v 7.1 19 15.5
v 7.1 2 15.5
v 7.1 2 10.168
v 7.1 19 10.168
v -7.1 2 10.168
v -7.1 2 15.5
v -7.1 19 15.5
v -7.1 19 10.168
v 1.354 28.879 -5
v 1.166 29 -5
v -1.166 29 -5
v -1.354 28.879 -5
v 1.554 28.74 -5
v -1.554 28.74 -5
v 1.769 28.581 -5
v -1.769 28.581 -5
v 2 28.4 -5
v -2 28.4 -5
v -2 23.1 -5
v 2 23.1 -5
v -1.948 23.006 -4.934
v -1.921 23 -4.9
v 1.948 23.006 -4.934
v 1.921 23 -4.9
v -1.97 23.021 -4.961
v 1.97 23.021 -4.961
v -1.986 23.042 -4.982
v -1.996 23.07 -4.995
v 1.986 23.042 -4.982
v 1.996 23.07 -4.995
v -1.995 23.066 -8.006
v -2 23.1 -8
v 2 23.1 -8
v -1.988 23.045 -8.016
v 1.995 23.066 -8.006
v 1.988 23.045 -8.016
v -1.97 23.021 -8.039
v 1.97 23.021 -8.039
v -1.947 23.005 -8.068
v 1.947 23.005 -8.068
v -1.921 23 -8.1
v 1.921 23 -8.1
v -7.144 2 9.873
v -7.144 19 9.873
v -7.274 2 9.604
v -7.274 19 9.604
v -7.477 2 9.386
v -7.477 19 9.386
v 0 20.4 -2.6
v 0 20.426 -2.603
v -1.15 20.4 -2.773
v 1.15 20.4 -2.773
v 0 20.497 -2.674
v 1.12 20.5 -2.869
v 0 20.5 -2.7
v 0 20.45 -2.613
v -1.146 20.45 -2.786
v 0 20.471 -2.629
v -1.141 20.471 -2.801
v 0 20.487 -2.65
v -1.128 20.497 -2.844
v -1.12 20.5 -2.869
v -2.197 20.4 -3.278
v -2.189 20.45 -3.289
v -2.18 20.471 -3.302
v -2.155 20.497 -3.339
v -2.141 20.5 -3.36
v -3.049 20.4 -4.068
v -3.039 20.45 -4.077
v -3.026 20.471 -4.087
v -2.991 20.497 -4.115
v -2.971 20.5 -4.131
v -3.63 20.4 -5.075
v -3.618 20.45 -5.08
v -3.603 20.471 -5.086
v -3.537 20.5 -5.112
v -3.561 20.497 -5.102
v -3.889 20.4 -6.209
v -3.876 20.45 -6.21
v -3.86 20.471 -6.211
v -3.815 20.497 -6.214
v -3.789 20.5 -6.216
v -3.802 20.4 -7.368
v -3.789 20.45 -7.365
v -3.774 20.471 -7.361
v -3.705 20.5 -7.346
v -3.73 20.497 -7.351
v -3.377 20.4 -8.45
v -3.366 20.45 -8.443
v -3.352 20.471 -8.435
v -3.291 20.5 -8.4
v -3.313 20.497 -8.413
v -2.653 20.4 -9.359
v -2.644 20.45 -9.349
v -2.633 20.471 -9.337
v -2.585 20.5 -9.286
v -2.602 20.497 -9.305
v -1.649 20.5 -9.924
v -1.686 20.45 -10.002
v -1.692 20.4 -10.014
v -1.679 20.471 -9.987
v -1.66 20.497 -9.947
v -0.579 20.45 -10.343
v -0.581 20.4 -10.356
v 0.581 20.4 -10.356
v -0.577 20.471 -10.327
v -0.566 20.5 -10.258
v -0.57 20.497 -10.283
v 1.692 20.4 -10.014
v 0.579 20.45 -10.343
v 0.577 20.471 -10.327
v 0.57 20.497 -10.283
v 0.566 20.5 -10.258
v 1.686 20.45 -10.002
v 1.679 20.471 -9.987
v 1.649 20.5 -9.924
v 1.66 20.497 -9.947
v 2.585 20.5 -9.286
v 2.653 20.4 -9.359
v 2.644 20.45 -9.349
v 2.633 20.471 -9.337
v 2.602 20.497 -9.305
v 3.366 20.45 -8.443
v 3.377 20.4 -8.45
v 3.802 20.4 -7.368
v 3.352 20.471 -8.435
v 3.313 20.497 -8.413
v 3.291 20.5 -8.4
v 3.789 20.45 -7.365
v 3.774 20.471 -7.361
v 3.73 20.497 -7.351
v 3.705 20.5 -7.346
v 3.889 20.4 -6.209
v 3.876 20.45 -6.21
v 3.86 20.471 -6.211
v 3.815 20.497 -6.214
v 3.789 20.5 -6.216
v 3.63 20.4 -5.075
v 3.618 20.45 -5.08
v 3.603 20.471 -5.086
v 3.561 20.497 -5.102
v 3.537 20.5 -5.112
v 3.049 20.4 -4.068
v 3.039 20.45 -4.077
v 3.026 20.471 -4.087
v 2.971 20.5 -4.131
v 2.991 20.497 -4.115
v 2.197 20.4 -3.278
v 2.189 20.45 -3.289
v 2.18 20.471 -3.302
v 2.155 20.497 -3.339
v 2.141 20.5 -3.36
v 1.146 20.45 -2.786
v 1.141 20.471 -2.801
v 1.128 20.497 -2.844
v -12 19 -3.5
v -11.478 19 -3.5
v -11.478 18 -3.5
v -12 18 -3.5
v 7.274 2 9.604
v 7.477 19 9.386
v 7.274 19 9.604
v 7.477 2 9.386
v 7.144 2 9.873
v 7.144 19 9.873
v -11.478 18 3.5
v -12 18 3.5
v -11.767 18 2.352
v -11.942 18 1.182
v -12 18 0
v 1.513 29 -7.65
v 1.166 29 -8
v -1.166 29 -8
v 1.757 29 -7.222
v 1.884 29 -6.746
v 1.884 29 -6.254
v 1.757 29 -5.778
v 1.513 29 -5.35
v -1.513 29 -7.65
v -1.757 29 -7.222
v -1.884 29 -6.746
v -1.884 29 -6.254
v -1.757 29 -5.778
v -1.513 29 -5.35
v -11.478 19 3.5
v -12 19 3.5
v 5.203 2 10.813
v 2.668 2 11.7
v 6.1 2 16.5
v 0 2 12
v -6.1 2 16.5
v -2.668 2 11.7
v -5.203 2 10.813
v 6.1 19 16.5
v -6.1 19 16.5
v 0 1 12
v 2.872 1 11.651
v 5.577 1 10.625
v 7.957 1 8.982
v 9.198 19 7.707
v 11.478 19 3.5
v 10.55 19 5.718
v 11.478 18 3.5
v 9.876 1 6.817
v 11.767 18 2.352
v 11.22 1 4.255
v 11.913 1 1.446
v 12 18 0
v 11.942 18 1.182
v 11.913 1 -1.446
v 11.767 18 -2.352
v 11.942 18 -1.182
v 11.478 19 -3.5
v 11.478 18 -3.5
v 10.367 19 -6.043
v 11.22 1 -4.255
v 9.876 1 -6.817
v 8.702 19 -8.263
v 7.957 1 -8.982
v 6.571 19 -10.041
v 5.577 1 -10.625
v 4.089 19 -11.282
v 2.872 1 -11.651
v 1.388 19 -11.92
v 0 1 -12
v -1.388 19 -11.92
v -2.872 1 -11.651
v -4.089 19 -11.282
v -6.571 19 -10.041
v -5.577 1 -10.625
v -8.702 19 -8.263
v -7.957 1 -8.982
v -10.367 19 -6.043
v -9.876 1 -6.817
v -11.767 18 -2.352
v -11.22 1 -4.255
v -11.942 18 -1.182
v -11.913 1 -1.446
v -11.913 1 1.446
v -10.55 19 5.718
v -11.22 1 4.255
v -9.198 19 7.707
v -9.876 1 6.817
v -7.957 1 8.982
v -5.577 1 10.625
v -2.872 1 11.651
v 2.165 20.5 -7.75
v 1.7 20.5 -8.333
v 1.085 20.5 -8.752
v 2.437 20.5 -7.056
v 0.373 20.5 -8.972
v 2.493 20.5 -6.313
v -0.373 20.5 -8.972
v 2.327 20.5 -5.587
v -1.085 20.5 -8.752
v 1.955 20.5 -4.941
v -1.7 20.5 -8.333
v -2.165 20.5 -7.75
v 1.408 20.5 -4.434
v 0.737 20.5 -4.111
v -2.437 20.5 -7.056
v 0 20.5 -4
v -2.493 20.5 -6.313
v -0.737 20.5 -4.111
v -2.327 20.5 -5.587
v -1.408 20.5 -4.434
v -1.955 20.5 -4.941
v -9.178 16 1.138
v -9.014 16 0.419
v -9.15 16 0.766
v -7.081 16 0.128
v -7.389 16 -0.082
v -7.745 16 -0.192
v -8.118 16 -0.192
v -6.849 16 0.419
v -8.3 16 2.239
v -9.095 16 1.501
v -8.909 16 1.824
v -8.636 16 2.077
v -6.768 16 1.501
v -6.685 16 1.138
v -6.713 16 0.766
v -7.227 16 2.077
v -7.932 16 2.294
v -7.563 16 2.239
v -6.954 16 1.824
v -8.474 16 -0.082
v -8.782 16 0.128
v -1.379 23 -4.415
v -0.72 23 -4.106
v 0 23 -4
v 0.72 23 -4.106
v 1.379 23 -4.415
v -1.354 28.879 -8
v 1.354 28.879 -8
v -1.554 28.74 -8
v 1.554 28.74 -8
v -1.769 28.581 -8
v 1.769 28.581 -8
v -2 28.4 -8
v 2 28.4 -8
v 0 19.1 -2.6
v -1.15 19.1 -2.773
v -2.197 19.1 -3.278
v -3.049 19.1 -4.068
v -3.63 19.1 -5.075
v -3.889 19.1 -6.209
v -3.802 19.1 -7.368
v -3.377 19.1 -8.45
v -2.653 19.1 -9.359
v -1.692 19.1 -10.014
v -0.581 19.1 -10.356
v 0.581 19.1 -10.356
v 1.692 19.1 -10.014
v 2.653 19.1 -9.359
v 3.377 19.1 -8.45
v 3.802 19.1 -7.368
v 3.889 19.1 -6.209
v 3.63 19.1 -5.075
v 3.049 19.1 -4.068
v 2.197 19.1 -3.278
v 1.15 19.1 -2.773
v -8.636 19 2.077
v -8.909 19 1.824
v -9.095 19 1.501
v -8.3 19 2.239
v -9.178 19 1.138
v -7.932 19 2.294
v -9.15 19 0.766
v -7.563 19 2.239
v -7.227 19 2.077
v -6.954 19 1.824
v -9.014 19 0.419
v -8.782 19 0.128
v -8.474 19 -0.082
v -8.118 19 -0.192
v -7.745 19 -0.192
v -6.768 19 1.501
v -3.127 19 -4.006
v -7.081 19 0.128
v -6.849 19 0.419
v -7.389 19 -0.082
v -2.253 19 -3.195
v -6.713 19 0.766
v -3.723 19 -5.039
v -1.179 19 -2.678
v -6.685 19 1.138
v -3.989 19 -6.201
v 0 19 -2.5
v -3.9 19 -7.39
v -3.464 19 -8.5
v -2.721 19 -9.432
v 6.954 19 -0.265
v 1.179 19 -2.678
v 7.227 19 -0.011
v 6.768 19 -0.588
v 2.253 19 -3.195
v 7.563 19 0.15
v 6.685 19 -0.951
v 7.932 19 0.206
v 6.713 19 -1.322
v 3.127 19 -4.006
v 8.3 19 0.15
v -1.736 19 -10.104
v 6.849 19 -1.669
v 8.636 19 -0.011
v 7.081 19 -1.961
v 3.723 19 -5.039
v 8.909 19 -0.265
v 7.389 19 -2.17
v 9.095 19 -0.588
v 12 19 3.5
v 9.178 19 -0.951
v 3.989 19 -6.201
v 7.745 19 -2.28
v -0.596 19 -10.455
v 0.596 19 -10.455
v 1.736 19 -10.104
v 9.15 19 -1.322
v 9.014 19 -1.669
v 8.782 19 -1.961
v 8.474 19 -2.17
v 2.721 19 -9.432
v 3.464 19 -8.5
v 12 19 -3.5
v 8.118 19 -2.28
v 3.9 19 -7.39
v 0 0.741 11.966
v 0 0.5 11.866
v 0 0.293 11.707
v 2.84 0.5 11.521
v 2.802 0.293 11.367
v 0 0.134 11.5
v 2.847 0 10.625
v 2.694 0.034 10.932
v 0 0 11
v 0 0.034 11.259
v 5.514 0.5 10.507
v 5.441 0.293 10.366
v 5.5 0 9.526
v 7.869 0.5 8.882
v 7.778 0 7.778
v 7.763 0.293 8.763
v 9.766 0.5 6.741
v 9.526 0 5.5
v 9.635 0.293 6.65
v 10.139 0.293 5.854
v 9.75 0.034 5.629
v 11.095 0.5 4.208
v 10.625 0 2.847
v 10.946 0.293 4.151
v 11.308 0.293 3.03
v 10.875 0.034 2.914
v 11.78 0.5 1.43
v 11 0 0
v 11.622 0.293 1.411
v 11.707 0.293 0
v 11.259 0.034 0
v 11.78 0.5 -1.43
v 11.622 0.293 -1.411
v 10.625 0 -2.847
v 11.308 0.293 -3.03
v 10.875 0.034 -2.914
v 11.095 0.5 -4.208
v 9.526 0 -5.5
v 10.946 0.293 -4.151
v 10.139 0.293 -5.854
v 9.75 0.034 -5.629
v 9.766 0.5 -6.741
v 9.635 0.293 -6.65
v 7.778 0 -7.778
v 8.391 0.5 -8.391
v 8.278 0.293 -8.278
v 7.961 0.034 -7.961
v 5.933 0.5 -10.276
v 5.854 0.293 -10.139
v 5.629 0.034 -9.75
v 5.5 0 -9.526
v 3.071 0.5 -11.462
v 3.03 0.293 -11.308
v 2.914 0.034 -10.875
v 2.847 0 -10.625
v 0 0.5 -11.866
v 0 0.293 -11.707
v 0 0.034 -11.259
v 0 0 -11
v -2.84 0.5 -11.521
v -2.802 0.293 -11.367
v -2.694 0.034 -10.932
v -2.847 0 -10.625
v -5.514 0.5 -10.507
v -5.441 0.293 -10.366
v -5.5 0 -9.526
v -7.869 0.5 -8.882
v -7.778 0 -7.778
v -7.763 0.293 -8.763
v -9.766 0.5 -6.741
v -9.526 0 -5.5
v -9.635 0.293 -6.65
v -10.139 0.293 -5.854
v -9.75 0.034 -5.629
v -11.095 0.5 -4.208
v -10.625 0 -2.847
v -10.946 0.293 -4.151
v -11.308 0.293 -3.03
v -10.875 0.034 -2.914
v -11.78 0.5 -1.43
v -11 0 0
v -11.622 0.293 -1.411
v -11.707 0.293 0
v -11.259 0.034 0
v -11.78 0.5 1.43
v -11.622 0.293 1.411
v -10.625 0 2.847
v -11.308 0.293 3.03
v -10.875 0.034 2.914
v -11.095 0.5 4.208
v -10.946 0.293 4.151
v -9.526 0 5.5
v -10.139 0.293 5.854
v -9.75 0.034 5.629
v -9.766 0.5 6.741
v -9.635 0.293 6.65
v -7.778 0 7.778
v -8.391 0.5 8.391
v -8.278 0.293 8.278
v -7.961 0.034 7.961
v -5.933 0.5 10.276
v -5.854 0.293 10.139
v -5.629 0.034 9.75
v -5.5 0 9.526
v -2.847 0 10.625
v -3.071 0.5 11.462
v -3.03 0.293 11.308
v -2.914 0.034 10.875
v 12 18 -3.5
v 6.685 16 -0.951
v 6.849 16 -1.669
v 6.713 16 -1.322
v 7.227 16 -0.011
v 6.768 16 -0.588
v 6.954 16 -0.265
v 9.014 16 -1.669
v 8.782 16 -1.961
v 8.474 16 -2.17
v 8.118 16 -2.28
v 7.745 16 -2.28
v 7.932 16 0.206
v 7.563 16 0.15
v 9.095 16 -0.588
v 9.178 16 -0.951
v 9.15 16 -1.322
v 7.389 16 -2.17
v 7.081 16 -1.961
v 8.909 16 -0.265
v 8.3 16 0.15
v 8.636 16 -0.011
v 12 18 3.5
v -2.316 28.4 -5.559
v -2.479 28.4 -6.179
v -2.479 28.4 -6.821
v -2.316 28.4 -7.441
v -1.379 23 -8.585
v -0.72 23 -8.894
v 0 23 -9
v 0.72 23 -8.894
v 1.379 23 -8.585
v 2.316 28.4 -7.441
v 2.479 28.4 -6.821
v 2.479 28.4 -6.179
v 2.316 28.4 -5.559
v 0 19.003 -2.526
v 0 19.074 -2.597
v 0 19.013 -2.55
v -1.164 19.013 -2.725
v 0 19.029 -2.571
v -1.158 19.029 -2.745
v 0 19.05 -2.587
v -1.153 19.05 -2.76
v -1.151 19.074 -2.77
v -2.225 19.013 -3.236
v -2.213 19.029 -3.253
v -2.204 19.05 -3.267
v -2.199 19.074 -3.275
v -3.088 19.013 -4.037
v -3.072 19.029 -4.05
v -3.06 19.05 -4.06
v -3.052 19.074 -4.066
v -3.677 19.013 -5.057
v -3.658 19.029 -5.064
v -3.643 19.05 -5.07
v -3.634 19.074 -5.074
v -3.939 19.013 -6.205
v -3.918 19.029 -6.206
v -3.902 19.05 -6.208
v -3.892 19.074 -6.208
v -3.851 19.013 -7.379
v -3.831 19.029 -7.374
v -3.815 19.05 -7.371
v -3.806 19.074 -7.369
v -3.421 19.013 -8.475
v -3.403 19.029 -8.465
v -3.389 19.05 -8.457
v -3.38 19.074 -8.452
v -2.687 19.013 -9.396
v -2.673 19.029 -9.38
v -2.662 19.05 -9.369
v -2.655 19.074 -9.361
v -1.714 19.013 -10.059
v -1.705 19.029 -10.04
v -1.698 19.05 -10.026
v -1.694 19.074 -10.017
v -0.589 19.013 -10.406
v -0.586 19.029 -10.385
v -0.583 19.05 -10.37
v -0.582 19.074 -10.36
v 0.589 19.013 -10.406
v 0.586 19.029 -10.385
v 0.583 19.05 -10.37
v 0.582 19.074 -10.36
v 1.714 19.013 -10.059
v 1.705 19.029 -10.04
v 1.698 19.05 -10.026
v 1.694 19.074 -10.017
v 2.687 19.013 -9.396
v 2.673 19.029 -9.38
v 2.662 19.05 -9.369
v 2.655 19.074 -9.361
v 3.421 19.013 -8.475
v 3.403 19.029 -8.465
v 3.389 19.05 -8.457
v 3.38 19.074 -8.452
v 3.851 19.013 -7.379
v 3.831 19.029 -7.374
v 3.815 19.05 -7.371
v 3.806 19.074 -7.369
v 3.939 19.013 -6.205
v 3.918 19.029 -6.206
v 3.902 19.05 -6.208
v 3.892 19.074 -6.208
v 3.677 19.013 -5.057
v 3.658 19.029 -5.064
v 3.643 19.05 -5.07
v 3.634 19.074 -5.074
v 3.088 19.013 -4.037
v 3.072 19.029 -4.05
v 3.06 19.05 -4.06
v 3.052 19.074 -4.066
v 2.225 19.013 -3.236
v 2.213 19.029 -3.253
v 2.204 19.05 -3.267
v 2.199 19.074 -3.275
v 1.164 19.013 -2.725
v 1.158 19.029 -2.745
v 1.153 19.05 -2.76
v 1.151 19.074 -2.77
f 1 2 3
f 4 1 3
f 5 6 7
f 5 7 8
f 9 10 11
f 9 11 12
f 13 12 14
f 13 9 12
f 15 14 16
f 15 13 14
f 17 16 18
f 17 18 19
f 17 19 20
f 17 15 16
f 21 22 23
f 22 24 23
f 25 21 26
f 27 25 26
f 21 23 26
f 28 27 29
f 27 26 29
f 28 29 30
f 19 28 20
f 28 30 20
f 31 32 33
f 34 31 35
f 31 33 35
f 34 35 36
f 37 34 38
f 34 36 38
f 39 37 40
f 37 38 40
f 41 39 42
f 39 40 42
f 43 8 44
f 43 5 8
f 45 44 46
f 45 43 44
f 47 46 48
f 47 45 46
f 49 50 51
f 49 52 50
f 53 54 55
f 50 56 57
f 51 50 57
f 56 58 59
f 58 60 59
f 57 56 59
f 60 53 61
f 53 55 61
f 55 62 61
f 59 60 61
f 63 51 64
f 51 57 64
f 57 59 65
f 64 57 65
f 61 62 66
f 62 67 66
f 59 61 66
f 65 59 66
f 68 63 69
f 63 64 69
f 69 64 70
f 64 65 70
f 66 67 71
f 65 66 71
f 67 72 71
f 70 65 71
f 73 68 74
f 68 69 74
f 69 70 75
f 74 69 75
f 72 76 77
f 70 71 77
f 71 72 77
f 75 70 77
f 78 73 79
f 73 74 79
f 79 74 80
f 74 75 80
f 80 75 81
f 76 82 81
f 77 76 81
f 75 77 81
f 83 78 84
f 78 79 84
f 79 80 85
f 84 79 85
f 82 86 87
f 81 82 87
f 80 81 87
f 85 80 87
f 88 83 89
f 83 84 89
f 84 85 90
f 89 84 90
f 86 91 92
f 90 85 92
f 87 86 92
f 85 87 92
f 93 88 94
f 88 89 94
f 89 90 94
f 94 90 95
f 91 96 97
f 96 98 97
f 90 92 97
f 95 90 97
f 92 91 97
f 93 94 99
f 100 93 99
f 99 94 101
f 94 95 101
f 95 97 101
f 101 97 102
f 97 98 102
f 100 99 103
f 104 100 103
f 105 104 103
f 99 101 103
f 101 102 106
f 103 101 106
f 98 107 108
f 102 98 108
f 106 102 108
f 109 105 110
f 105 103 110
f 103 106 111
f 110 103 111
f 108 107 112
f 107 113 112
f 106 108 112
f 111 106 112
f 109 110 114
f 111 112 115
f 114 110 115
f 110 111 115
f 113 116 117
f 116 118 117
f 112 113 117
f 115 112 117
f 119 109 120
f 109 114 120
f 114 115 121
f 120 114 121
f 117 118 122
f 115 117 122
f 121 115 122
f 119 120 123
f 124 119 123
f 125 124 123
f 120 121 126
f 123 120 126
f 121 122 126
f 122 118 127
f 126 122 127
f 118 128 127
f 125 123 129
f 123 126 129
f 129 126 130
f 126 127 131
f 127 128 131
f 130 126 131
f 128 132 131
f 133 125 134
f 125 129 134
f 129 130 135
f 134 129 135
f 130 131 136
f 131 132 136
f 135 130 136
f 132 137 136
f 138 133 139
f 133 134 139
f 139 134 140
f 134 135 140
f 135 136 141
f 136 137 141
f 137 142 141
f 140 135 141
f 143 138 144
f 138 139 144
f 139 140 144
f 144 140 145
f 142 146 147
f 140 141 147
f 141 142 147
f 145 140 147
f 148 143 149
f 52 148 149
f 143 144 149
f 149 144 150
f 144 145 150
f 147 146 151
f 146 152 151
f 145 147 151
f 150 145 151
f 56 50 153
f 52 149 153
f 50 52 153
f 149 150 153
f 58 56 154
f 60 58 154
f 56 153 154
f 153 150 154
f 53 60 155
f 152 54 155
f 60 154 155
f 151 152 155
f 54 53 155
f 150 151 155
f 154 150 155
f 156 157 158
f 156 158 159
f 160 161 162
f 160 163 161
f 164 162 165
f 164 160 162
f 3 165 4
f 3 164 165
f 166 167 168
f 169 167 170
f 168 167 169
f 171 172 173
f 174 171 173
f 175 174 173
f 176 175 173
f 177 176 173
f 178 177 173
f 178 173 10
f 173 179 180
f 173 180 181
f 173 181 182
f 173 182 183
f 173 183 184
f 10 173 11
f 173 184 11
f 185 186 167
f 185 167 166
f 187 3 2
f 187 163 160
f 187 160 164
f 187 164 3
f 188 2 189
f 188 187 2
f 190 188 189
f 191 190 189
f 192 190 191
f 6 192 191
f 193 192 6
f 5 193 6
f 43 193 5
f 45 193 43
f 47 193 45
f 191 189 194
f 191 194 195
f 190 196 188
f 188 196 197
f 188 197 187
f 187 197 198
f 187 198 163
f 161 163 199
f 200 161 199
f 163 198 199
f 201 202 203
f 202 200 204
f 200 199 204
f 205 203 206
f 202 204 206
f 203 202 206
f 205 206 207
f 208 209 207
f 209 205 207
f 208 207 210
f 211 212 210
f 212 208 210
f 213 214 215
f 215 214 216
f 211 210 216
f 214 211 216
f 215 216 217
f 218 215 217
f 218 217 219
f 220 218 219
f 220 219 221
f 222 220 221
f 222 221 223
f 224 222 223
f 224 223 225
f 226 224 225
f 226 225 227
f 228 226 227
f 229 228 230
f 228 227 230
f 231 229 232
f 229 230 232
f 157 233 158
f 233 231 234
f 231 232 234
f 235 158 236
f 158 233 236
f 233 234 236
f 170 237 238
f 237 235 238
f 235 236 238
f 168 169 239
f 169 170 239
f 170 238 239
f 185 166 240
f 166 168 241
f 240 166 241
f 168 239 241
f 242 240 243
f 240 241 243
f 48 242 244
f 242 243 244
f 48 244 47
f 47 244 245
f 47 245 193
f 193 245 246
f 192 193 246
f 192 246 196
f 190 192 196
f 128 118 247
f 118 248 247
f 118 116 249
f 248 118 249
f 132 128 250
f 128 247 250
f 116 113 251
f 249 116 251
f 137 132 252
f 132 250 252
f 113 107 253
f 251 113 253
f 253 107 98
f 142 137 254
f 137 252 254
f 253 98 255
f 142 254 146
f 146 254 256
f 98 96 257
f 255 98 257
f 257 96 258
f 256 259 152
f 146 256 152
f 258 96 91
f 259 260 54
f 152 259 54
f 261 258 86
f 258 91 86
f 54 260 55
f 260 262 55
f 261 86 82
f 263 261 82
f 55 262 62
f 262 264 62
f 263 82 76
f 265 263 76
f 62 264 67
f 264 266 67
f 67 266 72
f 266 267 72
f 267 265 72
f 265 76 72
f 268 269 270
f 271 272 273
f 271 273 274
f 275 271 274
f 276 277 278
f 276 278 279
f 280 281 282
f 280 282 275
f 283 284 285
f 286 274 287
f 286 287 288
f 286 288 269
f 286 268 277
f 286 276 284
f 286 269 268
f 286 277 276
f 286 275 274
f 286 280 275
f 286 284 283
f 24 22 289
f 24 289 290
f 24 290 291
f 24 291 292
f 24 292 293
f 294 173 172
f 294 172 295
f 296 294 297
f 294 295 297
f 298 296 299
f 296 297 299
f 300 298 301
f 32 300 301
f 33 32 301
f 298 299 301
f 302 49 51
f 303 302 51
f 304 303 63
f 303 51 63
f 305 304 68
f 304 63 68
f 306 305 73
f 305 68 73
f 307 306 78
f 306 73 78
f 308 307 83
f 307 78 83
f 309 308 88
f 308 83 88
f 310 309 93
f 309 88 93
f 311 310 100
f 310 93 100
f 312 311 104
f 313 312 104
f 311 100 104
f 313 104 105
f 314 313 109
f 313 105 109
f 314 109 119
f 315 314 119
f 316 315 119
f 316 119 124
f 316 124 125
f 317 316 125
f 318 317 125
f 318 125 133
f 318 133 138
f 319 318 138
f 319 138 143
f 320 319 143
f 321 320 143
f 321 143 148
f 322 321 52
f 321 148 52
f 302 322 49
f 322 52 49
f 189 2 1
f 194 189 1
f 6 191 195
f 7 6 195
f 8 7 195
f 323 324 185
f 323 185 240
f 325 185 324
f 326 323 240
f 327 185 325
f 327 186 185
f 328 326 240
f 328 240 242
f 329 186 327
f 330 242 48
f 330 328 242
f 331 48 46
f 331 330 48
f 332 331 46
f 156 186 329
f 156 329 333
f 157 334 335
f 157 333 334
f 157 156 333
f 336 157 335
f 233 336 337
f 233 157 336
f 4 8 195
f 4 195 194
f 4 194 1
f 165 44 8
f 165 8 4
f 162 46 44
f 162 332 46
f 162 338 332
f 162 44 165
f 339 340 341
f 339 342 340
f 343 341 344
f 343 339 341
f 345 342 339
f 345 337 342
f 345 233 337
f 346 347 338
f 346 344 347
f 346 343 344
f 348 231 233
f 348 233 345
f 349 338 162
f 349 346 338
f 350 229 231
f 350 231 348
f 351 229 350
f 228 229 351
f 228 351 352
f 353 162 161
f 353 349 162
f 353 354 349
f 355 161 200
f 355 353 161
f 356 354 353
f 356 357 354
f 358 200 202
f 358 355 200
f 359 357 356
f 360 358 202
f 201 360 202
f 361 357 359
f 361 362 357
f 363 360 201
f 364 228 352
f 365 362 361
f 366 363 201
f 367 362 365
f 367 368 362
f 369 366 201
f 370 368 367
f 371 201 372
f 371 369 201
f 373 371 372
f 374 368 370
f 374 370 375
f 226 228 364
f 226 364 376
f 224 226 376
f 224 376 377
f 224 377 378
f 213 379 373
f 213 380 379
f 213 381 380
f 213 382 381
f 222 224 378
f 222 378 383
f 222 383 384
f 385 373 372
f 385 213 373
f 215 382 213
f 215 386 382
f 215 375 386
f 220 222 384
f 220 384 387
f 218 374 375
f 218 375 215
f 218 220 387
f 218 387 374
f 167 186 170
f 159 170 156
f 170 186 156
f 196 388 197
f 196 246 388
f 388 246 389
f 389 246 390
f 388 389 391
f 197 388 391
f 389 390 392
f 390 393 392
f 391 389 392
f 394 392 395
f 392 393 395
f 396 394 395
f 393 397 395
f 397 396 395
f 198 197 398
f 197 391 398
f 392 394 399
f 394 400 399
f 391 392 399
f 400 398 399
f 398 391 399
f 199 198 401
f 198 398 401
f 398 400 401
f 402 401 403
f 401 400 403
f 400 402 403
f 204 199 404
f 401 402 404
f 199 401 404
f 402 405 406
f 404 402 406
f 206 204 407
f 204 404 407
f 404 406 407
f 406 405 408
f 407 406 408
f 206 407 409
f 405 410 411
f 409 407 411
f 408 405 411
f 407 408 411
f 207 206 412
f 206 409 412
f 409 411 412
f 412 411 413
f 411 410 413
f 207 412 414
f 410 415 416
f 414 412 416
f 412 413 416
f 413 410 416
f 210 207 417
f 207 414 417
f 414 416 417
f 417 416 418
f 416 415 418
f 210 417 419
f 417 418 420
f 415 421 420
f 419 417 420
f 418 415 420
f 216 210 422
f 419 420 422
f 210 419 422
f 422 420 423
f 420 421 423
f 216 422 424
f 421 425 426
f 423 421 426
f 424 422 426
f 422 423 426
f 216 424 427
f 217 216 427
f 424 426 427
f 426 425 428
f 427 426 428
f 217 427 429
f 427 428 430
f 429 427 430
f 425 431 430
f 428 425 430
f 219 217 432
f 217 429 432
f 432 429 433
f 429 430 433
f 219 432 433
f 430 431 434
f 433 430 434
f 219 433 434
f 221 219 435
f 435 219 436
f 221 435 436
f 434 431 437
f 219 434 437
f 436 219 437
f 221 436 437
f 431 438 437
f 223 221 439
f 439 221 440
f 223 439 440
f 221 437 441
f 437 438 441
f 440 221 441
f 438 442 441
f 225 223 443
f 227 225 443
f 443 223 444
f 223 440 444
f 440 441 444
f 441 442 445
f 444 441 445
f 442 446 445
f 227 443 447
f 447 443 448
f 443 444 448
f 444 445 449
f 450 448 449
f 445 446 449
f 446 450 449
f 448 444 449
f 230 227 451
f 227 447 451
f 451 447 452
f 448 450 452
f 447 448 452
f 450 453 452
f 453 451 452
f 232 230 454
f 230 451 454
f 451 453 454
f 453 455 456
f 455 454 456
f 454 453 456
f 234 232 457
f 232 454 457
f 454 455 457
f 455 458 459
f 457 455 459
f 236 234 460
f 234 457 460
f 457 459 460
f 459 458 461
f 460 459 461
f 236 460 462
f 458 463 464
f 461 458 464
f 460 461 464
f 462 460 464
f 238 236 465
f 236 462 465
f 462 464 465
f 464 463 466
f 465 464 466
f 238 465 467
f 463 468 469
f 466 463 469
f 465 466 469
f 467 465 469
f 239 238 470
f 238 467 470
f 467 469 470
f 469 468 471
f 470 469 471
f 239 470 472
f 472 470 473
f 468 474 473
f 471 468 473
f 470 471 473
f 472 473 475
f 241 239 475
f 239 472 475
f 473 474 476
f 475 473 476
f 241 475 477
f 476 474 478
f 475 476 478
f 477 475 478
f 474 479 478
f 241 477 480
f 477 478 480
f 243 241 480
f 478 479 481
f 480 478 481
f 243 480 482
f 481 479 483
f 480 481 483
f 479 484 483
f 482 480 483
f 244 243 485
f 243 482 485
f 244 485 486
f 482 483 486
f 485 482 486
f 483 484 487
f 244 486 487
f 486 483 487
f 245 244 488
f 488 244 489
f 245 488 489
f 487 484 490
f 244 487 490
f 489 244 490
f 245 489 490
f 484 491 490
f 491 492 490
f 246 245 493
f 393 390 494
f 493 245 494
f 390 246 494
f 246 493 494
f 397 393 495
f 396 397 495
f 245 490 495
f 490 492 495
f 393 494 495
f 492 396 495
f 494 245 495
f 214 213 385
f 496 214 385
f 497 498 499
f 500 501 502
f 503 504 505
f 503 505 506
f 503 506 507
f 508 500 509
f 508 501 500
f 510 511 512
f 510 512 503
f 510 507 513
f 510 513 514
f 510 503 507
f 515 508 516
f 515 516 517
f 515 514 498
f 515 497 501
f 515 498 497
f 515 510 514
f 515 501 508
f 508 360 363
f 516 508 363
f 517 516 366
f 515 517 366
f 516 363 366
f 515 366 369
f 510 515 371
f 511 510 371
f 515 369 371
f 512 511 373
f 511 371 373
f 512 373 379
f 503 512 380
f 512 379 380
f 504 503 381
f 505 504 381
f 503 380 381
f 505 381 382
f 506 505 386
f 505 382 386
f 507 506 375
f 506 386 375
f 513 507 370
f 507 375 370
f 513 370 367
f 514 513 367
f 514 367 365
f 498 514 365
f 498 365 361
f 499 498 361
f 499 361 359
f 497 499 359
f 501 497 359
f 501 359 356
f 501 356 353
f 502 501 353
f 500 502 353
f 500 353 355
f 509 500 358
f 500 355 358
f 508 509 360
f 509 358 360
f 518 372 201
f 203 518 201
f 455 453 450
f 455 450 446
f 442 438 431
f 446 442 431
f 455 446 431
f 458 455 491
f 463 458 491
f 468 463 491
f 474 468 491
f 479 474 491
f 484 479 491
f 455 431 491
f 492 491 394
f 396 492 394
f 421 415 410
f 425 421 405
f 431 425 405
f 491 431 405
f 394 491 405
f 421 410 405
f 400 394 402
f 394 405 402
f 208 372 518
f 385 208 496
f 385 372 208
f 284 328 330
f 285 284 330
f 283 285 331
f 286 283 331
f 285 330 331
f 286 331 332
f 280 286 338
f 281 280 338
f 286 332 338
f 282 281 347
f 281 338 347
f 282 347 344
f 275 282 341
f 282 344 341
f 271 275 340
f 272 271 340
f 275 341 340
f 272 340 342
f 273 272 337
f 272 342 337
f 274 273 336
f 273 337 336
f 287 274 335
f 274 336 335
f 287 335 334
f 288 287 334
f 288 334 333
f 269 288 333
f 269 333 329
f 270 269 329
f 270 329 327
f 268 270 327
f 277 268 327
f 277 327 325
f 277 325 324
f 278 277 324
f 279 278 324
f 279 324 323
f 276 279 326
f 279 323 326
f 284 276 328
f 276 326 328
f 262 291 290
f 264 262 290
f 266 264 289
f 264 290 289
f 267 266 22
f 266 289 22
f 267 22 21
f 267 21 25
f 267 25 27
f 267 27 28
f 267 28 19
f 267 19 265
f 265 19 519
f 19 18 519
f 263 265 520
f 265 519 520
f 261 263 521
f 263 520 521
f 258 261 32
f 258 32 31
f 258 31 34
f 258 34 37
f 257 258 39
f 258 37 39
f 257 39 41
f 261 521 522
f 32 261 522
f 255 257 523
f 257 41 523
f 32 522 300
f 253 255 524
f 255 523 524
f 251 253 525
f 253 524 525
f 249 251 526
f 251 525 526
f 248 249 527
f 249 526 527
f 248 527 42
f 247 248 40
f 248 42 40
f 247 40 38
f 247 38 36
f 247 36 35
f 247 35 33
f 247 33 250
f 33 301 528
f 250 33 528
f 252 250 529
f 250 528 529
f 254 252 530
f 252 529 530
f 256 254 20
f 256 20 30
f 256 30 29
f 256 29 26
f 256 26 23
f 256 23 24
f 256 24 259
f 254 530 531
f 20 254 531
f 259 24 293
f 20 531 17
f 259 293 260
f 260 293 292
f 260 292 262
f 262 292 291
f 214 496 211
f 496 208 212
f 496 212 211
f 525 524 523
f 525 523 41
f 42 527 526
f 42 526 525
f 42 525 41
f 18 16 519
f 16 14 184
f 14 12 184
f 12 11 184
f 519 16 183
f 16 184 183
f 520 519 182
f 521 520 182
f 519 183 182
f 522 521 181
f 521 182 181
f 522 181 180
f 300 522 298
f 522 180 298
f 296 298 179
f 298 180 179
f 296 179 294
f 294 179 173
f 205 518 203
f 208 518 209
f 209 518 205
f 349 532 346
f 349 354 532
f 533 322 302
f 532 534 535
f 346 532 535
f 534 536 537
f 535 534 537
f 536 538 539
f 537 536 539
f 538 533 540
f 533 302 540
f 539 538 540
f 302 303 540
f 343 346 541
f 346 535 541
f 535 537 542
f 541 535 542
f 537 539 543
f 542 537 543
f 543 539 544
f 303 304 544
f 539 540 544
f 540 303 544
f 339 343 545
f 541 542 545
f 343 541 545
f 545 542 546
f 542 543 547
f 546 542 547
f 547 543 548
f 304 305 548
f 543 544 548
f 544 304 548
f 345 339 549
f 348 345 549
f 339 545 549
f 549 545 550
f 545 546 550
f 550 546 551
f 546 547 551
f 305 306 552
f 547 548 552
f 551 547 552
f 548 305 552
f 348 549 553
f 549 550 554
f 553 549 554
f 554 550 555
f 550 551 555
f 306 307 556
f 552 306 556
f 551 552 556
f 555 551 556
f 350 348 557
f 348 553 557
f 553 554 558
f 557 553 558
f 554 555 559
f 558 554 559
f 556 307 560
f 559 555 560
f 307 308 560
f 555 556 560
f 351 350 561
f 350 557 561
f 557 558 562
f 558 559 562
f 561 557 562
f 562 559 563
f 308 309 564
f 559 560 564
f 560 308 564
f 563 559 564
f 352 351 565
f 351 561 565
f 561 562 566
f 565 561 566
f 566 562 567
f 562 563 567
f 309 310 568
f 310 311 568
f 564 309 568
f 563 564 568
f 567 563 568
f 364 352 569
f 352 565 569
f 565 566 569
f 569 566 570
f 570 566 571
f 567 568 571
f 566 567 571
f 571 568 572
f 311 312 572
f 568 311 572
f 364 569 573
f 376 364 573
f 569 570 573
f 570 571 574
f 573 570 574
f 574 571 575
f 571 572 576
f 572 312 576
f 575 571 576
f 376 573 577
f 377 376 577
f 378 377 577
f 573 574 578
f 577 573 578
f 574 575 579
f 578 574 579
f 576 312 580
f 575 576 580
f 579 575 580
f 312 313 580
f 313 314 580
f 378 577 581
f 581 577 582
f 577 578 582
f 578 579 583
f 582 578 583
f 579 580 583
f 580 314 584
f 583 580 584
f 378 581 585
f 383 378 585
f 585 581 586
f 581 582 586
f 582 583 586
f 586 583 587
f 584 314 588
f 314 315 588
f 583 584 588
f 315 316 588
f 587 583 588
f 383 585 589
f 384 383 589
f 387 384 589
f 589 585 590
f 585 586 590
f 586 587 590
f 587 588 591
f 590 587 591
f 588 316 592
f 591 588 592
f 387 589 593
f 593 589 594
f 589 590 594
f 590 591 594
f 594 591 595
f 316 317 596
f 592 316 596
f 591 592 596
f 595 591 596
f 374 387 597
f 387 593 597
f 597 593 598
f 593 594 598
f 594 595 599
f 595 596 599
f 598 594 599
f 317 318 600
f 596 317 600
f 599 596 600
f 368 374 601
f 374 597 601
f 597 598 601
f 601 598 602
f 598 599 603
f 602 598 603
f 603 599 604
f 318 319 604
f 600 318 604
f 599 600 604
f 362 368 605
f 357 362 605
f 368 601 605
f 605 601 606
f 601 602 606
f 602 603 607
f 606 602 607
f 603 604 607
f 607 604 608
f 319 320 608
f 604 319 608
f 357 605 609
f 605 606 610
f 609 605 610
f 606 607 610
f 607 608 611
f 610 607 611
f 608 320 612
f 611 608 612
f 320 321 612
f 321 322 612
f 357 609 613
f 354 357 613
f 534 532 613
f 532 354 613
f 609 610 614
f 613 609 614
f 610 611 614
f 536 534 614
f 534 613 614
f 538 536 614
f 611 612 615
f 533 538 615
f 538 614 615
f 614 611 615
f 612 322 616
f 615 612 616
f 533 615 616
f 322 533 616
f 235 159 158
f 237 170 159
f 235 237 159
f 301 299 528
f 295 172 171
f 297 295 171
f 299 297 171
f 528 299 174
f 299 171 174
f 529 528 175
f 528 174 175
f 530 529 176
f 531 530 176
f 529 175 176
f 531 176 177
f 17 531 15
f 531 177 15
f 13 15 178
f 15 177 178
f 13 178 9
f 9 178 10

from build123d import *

# Parameters (mm, degrees)
SKETCH1_R           = 12
BOSS_EXTRUDE1_DEPTH = 19
SKETCH2_W           = 14.2
SKETCH2_H           = 7.594673869
BOSS_EXTRUDE2_DEPTH = 17
SKETCH3_R           = 2.05
BOSS_EXTRUDE3_DEPTH = 1
CHAMFER1_SIZE       = 0.6
SKETCH5_W           = 6
SKETCH5_H           = 2
CUT_EXTRUDE1_DEPTH  = 6
FILLET1_R           = 0.1
CHAMFER2_SIZE       = 1
FILLET2_R           = 1
FILLET3_R           = 0.1
FILLET4_R           = 1
SKETCH6_W           = 9.256543548
SKETCH6_H           = 10.153653495
CUT_EXTRUDE2_DEPTH  = 32.531730051
SKETCH8_R           = 1.25
CUT_EXTRUDE3_DEPTH  = 3


with BuildPart() as part:
    # Sketch1 → Boss-Extrude1 (new body)
    with BuildSketch(Plane(origin=(0, 0, 0), x_dir=(1, 0, 0), z_dir=(0, 1, 0))):
        with Locations(Location((0, 0, 0), (0, 0, 270))):
            Circle(SKETCH1_R)
    extrude(amount=BOSS_EXTRUDE1_DEPTH)

    # Sketch2 → Boss-Extrude2 (add)
    with BuildSketch(Plane(origin=(0, 2, 0), x_dir=(-1, 0, 0), z_dir=(0, -1, 0))):
        with Locations((0, -12.702663066)):
            Rectangle(SKETCH2_W, SKETCH2_H)
    extrude(amount=-BOSS_EXTRUDE2_DEPTH)

    # Sketch3 → Boss-Extrude3 (add)
    # profile 1 of 2: a face of its own
    with BuildSketch(Plane(origin=(0, 19, 0), x_dir=(1, 0, 0), z_dir=(0, 1, 0))):
        with BuildLine():
            Line((-15.5, -3.5), (-8, -3.5))
            Line((-8, -3.5), (-8, 3.5))
            Line((-8, 3.5), (-15.5, 3.5))
            ThreePointArc((-15.5, 3.5), (-19, 0), (-15.5, -3.5))
        make_face()
        with Locations(Location((-15.5, 0, 0), (0, 0, 270))):
            Circle(SKETCH3_R, mode=Mode.SUBTRACT)
    # profile 2 of 2: a face of its own
    with BuildSketch(Plane(origin=(0, 19, 0), x_dir=(1, 0, 0), z_dir=(0, 1, 0))):
        with BuildLine():
            Line((8, -3.5), (8, 3.5))
            Line((8, 3.5), (15.5, 3.5))
            ThreePointArc((15.5, 3.5), (19, 0), (15.5, -3.5))
            Line((15.5, -3.5), (8, -3.5))
        make_face()
        with Locations(Location((15.5, 0, 0), (0, 0, 90))):
            Circle(SKETCH3_R, mode=Mode.SUBTRACT)
    extrude(amount=-BOSS_EXTRUDE3_DEPTH)

    # Sketch4 → Revolve1 (revolve)
    with BuildSketch(Plane(origin=(0, 0, 0), x_dir=(0, 0, -1), z_dir=(1, 0, 0))):
        Polygon((6.5, 19), (2.6, 19), (2.6, 20.5), (4, 20.5), (4, 29), (6.5, 29), align=None)
    revolve(axis=Axis((0, 23.531707116, -6.5), (0, -1, 0)))

    # Chamfer1
    chamfer1_edges = [part.edges().sort_by_distance(p)[0] for p in [
        (0, 29, -9),
    ]]
    chamfer(chamfer1_edges, length=CHAMFER1_SIZE)

    # Sketch5 → Cut-Extrude1 (cut)
    with BuildSketch(Plane(origin=(0, 29, 0), x_dir=(1, 0, 0), z_dir=(0, 1, 0))):
        with Locations((0, 9)):
            Rectangle(SKETCH5_W, SKETCH5_H)
        with Locations((0, 4)):
            Rectangle(SKETCH5_W, SKETCH5_H)
    extrude(amount=-CUT_EXTRUDE1_DEPTH, mode=Mode.SUBTRACT)

    # Fillet1
    fillet1_edges = [part.edges().sort_by_distance(p)[0] for p in [
        (0, 23, -8),
        (0, 23, -5),
    ]]
    fillet(fillet1_edges, radius=FILLET1_R)

    # Chamfer2
    chamfer2_edges = [part.edges().sort_by_distance(p)[0] for p in [
        (-7.1, 10.5, 16.5),
        (7.1, 10.5, 16.5),
    ]]
    chamfer(chamfer2_edges, length=CHAMFER2_SIZE)

    # Fillet2
    fillet2_edges = [part.edges().sort_by_distance(p)[0] for p in [
        (7.1, 10.5, 9.674192473),
        (-7.1, 10.5, 9.674192473),
    ]]
    fillet(fillet2_edges, radius=FILLET2_R)

    # Fillet3
    fillet3_edges = [part.edges().sort_by_distance(p)[0] for p in [
        (0, 19, -10.4),
        (0, 20.5, -10.4),
    ]]
    fillet(fillet3_edges, radius=FILLET3_R)

    # Fillet4
    fillet4_edges = [part.edges().sort_by_distance(p)[0] for p in [
        (0, 0, -12),
    ]]
    fillet(fillet4_edges, radius=FILLET4_R)

    # Sketch6 → Cut-Extrude2 (cut, through all)
    with BuildSketch(Plane(origin=(0, 19, 0), x_dir=(1, 0, 0), z_dir=(0, 1, 0))):
        with Locations((-16.628271774, -0.333446931)):
            Rectangle(SKETCH6_W, SKETCH6_H)
        with Locations((16.628271774, -0.333446931)):
            Rectangle(SKETCH6_W, SKETCH6_H)
    extrude(amount=-CUT_EXTRUDE2_DEPTH, mode=Mode.SUBTRACT)

    # Sketch8 → Cut-Extrude3 (cut)
    with BuildSketch(Plane(origin=(0, 19, 0), x_dir=(1, 0, 0), z_dir=(0, 1, 0))):
        with Locations(Location((-7.931558639, -1.044209433, 0), (0, 0, 270))):
            Circle(SKETCH8_R)
        with Locations(Location((7.931559171, 1.044209433, 0), (0, 0, 270))):
            Circle(SKETCH8_R)
    extrude(amount=-CUT_EXTRUDE3_DEPTH, mode=Mode.SUBTRACT)


solid = part.part
